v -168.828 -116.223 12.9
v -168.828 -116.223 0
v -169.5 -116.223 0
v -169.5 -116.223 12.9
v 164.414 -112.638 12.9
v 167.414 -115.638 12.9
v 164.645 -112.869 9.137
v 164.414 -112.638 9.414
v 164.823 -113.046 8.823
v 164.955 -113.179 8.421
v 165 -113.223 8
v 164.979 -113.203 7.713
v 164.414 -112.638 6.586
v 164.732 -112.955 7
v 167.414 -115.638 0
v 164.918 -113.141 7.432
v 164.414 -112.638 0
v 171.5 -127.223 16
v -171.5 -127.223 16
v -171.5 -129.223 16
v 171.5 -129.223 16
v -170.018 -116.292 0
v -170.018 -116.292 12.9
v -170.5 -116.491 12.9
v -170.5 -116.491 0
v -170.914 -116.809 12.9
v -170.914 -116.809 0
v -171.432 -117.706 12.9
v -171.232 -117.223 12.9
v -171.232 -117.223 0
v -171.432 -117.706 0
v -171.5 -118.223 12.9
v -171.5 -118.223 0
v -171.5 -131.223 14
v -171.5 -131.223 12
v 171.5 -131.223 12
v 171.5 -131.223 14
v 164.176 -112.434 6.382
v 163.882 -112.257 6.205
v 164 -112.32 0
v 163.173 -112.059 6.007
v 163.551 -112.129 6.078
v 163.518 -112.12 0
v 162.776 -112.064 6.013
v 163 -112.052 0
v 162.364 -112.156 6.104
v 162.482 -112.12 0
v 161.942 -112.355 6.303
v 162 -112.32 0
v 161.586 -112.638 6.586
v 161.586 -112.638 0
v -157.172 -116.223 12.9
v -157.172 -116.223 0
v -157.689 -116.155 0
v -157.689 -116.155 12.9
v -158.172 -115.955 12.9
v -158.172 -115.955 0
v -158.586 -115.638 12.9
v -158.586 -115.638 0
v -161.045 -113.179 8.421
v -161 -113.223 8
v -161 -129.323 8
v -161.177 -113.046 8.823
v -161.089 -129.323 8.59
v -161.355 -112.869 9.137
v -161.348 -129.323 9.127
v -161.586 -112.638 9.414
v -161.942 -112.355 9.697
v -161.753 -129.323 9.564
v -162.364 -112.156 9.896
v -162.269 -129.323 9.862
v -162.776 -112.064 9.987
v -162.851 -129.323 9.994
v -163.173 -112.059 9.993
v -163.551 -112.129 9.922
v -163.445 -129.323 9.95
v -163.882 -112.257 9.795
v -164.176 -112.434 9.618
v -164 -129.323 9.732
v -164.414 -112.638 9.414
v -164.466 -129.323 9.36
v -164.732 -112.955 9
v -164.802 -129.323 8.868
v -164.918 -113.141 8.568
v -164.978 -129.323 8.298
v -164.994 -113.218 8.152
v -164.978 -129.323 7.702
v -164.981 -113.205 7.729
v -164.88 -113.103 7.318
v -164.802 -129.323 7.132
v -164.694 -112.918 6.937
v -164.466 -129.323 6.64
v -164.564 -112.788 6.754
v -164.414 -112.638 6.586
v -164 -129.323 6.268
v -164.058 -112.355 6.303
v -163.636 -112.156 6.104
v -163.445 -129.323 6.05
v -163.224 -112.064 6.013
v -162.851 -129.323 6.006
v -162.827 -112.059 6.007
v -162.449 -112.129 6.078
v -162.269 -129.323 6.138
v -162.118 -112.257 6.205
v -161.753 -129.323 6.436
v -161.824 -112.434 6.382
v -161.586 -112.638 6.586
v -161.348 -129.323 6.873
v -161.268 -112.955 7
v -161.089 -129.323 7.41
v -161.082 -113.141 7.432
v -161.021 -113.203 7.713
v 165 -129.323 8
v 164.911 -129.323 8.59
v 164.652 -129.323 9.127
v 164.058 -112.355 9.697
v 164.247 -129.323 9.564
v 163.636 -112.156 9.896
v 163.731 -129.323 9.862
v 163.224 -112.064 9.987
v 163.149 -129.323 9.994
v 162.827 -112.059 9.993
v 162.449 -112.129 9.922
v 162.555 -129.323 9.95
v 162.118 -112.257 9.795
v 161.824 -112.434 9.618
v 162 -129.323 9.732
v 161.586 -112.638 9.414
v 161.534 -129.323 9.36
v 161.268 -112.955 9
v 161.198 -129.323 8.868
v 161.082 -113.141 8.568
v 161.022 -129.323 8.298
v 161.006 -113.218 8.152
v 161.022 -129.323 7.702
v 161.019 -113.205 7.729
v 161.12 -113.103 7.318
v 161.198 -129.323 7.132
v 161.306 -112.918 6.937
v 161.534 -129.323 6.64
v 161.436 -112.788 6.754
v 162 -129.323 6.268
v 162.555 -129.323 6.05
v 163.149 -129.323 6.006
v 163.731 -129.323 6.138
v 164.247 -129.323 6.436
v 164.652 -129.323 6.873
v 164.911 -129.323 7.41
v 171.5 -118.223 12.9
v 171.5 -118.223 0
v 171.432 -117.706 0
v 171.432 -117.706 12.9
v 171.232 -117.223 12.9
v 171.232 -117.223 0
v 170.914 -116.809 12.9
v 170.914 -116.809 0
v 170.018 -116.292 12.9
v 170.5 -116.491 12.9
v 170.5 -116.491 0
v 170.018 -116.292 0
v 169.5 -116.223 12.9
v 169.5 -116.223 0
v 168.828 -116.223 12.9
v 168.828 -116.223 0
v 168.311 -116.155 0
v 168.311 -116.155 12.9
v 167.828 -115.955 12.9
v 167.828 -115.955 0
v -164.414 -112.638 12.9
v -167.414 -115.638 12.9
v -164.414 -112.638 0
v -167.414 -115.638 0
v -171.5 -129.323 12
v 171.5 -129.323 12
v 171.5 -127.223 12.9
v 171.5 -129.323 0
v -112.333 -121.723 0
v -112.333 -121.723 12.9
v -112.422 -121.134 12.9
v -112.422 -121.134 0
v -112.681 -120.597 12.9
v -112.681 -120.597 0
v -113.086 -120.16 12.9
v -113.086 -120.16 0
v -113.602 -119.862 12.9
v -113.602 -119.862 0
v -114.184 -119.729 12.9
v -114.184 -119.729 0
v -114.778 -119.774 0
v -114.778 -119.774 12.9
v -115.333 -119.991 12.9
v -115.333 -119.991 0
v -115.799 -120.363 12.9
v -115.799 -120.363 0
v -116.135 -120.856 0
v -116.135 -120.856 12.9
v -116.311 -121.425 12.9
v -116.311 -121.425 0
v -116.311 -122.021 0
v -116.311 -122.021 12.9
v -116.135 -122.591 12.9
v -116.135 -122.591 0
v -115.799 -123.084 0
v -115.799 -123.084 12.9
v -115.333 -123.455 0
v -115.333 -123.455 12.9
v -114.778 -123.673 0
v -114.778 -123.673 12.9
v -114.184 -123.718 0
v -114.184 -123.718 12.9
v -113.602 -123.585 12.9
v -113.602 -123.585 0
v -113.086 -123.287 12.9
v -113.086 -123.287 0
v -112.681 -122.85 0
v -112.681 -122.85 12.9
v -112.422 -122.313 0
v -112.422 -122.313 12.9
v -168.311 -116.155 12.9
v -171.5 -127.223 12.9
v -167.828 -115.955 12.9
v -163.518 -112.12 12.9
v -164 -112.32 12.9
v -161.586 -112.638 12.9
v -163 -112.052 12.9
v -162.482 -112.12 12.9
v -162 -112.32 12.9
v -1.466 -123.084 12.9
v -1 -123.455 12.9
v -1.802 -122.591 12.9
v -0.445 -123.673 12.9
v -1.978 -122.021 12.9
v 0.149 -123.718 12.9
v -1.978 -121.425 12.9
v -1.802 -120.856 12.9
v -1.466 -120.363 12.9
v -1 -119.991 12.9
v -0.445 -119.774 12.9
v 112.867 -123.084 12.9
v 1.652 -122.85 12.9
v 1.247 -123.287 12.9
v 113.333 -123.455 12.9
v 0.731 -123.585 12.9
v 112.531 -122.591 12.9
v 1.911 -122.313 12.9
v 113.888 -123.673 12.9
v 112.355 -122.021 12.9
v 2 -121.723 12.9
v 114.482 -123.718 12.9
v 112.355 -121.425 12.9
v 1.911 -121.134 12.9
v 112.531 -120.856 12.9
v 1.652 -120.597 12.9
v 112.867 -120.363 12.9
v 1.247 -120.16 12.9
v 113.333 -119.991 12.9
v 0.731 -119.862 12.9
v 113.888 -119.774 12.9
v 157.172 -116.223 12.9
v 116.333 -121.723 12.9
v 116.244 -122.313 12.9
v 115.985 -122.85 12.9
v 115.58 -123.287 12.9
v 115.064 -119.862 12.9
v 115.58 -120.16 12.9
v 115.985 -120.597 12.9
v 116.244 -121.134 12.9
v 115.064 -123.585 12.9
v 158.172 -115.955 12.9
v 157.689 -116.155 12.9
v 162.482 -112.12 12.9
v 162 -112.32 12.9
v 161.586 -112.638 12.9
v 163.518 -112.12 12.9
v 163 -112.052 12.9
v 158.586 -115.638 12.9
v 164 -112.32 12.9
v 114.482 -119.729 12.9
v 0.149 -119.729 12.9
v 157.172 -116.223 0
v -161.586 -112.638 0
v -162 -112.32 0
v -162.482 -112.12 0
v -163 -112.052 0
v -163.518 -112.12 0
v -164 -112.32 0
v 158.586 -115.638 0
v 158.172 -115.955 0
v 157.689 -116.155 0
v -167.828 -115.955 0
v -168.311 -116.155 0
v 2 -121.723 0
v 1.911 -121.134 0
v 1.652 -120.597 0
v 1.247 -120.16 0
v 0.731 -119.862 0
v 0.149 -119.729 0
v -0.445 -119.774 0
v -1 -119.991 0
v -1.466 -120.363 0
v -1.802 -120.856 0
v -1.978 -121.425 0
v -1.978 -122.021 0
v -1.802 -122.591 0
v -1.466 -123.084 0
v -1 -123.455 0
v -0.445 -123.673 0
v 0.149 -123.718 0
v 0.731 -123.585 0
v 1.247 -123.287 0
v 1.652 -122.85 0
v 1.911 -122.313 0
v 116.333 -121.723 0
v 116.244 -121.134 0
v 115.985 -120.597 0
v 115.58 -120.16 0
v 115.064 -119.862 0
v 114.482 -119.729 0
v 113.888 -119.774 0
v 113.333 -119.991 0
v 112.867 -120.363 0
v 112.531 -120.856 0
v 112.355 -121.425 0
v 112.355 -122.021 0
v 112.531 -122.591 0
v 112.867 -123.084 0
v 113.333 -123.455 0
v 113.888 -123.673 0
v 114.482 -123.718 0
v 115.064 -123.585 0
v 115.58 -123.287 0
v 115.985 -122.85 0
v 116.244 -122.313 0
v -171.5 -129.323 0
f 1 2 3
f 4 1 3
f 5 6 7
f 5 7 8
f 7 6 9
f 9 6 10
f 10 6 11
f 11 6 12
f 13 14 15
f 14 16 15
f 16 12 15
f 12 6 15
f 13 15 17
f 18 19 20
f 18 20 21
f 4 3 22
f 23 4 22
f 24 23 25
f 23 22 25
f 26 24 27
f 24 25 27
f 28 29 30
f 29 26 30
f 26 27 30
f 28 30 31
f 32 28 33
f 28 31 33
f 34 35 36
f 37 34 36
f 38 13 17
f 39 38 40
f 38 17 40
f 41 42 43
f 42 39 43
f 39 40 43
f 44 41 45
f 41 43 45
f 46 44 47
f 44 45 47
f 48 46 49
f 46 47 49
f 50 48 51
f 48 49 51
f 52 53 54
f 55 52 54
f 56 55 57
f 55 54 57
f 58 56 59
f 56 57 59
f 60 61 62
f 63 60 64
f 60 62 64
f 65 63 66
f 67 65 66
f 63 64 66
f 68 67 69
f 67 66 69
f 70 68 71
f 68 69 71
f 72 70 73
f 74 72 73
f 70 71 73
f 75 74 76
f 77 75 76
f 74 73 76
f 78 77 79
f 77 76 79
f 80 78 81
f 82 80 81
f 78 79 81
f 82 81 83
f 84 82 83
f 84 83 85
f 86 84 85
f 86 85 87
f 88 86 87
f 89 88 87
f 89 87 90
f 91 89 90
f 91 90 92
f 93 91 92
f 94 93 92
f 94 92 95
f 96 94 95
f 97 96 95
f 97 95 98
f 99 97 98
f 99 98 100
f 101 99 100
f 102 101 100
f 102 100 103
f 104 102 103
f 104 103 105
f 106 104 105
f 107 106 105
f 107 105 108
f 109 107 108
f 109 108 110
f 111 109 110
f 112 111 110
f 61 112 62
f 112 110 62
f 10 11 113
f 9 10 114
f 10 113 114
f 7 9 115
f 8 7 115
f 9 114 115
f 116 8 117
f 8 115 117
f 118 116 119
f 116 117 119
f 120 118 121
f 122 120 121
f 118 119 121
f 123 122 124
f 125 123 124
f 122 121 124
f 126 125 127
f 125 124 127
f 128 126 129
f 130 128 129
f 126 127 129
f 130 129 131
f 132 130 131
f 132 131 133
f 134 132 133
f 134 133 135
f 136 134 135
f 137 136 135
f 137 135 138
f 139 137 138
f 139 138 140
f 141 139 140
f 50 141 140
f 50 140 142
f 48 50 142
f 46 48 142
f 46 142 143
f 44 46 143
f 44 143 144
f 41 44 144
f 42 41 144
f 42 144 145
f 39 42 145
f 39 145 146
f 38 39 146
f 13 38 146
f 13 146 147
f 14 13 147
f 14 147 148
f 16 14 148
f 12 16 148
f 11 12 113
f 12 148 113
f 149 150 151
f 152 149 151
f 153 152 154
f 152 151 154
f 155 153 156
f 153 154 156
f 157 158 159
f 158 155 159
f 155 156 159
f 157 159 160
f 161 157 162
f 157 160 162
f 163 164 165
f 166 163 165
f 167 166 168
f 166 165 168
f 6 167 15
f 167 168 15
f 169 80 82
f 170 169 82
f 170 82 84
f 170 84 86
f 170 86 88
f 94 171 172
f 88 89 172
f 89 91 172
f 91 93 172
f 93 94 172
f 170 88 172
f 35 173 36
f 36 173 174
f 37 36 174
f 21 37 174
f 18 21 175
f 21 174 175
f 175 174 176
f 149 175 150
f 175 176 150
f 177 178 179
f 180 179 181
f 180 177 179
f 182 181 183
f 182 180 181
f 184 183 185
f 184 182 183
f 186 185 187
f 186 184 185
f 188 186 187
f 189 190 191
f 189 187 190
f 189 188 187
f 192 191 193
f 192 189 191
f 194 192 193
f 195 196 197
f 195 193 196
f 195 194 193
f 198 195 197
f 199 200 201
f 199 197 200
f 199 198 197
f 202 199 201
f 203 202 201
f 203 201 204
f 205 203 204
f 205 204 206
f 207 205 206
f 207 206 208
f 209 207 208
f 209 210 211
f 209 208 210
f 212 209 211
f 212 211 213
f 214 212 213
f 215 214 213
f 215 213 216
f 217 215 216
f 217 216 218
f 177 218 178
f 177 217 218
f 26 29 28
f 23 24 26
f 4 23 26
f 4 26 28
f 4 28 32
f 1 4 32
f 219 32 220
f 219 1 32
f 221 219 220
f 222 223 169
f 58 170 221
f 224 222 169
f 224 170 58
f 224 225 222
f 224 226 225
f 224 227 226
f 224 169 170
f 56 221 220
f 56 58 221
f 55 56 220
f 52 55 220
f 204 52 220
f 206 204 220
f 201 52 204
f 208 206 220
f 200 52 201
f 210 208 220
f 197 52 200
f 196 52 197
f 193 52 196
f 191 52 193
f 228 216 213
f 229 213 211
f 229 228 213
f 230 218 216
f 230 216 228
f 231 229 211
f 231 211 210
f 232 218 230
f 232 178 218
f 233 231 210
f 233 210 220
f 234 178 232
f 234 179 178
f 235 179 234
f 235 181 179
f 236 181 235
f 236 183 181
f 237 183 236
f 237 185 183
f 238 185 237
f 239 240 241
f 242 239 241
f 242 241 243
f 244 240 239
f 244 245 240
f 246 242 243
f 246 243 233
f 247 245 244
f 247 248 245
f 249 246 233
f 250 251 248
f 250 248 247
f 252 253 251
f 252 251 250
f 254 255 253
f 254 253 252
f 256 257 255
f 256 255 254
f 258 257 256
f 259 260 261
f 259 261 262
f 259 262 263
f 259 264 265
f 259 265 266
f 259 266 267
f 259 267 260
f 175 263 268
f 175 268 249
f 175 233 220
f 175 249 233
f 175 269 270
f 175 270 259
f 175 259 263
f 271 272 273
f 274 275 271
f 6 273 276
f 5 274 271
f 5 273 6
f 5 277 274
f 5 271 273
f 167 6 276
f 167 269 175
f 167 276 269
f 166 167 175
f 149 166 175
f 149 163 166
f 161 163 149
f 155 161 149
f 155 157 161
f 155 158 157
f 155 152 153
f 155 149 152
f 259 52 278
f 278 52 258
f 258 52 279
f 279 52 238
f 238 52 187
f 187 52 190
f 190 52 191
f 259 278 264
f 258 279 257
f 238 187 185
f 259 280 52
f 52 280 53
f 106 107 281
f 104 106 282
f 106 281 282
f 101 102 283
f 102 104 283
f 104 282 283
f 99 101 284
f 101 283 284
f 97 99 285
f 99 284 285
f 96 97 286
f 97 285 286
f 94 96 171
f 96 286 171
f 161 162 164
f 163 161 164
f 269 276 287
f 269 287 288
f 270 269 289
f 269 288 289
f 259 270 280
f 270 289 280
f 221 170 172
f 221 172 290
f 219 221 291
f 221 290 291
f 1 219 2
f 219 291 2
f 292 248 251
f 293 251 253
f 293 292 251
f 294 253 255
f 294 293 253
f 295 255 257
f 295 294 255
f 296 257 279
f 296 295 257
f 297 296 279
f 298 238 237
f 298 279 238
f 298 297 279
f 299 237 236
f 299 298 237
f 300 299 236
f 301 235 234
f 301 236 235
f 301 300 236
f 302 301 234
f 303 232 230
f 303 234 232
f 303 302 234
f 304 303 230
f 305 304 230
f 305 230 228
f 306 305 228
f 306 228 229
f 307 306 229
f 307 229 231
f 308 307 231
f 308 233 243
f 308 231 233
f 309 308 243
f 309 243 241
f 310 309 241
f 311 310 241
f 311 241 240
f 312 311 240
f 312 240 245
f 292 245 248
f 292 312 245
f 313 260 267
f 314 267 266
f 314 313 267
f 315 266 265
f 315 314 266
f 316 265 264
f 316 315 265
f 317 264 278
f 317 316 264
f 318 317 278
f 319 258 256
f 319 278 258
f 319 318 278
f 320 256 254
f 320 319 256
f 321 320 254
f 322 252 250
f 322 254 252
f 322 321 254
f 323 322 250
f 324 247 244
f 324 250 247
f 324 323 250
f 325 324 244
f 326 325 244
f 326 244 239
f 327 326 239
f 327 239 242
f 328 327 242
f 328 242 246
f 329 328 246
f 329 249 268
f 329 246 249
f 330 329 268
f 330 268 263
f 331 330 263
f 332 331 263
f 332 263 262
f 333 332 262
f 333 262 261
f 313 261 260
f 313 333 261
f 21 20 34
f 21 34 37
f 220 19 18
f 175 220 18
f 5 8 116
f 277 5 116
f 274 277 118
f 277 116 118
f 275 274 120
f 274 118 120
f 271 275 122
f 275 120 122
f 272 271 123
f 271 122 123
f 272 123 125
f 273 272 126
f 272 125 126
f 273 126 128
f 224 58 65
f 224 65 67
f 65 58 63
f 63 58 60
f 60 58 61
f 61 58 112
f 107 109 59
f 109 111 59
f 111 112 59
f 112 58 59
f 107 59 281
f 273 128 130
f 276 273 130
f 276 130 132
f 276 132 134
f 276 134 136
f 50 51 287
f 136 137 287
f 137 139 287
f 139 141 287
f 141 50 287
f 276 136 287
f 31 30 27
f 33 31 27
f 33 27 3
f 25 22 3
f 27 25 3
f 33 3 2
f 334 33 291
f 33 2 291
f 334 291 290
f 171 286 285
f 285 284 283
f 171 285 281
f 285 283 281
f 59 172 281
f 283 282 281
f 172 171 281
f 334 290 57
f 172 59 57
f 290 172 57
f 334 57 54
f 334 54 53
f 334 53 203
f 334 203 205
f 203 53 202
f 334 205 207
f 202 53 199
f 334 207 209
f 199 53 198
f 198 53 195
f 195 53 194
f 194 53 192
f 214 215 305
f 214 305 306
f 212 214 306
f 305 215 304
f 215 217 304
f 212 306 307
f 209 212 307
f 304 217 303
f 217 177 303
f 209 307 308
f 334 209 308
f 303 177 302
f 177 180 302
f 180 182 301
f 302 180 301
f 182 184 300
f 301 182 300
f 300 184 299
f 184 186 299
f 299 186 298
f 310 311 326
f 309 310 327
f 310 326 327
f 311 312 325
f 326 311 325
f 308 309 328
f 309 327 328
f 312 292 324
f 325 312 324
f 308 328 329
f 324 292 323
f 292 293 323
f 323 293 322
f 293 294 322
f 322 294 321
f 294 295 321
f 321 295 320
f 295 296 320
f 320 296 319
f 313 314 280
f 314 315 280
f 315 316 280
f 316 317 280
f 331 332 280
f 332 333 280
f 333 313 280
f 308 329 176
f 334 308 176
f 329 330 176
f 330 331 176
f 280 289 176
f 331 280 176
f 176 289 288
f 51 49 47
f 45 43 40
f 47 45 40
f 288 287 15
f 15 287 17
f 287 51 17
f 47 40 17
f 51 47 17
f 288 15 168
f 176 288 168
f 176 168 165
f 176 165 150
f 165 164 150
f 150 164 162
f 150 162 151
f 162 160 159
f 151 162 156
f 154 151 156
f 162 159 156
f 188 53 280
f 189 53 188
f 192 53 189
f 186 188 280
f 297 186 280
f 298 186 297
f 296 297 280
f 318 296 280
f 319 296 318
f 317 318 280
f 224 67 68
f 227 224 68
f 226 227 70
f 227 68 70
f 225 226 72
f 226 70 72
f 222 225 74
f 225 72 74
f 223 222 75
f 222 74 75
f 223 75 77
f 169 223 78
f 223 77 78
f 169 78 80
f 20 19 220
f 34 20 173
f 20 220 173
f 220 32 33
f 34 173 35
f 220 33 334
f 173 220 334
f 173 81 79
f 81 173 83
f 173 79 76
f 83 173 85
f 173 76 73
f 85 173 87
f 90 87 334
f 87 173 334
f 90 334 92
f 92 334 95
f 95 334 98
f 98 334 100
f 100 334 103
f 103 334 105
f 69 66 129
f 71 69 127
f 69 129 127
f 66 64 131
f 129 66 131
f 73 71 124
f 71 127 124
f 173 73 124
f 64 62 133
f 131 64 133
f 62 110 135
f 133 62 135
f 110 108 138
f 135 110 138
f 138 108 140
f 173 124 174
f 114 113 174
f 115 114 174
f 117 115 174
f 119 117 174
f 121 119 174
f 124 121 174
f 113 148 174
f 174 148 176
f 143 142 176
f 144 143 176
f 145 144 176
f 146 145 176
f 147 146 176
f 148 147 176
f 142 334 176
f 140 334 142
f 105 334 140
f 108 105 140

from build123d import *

# Parameters (mm, degrees)
F0_R     = 2
F1_DEPTH = 16
F2_SIZE  = 2
F3_W     = 349
F3_H     = 16
F4_DEPTH = 3.1
F5_W     = 345.2
F5_H     = 5
F6_DEPTH = 12
F7_R     = 2
F8_DEPTH = 17.272573


with BuildPart() as f1:
    # F0 (on Top) → F1 (new body)
    with BuildSketch(Plane.XY):
        with BuildLine():
            Line((-171.5, -127.73274), (-171.5, -131.223399))
            Line((-171.5, -131.223399), (171.5, -131.223399))
            Line((171.5, -131.223399), (171.5, -127.73274))
            Line((171.5, -127.73274), (171.5, -118.223399))
            ThreePointArc((171.5, -118.223399), (170.914214, -116.809185), (169.5, -116.223399))
            Line((169.5, -116.223399), (168.828427, -116.223399))
            ThreePointArc((168.828427, -116.223399), (168.06306, -116.071158), (167.414214, -115.637612))
            Line((167.414214, -115.637612), (164.414214, -112.637612))
            ThreePointArc((164.414214, -112.637612), (163, -112.051826), (161.585786, -112.637612))
            Line((161.585786, -112.637612), (158.585786, -115.637612))
            ThreePointArc((158.585786, -115.637612), (157.93694, -116.071158), (157.171573, -116.223399))
            Line((157.171573, -116.223399), (-154.5, -116.223399))
            Line((-154.5, -116.223399), (-157.171573, -116.223399))
            ThreePointArc((-157.171573, -116.223399), (-157.93694, -116.071158), (-158.585786, -115.637612))
            Line((-158.585786, -115.637612), (-161.585786, -112.637612))
            ThreePointArc((-161.585786, -112.637612), (-163, -112.051826), (-164.414214, -112.637612))
            Line((-164.414214, -112.637612), (-167.414214, -115.637612))
            ThreePointArc((-167.414214, -115.637612), (-168.06306, -116.071158), (-168.828427, -116.223399))
            Line((-168.828427, -116.223399), (-169.5, -116.223399))
            ThreePointArc((-169.5, -116.223399), (-170.914214, -116.809185), (-171.5, -118.223399))
            Line((-171.5, -118.223399), (-171.5, -127.73274))
        make_face()
        with Locations((-114.333, -121.723399)):
            Circle(F0_R, mode=Mode.SUBTRACT)
        with Locations((0, -121.723399)):
            Circle(F0_R, mode=Mode.SUBTRACT)
        with Locations((114.333, -121.723399)):
            Circle(F0_R, mode=Mode.SUBTRACT)
    extrude(amount=F1_DEPTH)

    # F2
    f2_edges = [f1.edges().sort_by_distance(p)[0] for p in [
        (0, -131.223399, 16),
    ]]
    chamfer(f2_edges, length=F2_SIZE)

    # F3 (on face) → F4 (cut)
    with BuildSketch(Plane.XY.offset(16)):
        with Locations((0, -119.223399)):
            Rectangle(F3_W, F3_H)
    extrude(amount=-F4_DEPTH, mode=Mode.SUBTRACT)

    # F5 (on face) → F6 (cut)
    with BuildSketch(Plane.XY):
        with Locations((0, -131.823399)):
            Rectangle(F5_W, F5_H)
    extrude(amount=F6_DEPTH, mode=Mode.SUBTRACT)

    # F7 (on face) → F8 (cut, through all)
    with BuildSketch(Plane.XZ.offset(129.323399)):
        with Locations((-163, 8)):
            Circle(F7_R)
        with Locations((163, 8)):
            Circle(F7_R)
    extrude(amount=-F8_DEPTH, mode=Mode.SUBTRACT)


solid = f1.part
